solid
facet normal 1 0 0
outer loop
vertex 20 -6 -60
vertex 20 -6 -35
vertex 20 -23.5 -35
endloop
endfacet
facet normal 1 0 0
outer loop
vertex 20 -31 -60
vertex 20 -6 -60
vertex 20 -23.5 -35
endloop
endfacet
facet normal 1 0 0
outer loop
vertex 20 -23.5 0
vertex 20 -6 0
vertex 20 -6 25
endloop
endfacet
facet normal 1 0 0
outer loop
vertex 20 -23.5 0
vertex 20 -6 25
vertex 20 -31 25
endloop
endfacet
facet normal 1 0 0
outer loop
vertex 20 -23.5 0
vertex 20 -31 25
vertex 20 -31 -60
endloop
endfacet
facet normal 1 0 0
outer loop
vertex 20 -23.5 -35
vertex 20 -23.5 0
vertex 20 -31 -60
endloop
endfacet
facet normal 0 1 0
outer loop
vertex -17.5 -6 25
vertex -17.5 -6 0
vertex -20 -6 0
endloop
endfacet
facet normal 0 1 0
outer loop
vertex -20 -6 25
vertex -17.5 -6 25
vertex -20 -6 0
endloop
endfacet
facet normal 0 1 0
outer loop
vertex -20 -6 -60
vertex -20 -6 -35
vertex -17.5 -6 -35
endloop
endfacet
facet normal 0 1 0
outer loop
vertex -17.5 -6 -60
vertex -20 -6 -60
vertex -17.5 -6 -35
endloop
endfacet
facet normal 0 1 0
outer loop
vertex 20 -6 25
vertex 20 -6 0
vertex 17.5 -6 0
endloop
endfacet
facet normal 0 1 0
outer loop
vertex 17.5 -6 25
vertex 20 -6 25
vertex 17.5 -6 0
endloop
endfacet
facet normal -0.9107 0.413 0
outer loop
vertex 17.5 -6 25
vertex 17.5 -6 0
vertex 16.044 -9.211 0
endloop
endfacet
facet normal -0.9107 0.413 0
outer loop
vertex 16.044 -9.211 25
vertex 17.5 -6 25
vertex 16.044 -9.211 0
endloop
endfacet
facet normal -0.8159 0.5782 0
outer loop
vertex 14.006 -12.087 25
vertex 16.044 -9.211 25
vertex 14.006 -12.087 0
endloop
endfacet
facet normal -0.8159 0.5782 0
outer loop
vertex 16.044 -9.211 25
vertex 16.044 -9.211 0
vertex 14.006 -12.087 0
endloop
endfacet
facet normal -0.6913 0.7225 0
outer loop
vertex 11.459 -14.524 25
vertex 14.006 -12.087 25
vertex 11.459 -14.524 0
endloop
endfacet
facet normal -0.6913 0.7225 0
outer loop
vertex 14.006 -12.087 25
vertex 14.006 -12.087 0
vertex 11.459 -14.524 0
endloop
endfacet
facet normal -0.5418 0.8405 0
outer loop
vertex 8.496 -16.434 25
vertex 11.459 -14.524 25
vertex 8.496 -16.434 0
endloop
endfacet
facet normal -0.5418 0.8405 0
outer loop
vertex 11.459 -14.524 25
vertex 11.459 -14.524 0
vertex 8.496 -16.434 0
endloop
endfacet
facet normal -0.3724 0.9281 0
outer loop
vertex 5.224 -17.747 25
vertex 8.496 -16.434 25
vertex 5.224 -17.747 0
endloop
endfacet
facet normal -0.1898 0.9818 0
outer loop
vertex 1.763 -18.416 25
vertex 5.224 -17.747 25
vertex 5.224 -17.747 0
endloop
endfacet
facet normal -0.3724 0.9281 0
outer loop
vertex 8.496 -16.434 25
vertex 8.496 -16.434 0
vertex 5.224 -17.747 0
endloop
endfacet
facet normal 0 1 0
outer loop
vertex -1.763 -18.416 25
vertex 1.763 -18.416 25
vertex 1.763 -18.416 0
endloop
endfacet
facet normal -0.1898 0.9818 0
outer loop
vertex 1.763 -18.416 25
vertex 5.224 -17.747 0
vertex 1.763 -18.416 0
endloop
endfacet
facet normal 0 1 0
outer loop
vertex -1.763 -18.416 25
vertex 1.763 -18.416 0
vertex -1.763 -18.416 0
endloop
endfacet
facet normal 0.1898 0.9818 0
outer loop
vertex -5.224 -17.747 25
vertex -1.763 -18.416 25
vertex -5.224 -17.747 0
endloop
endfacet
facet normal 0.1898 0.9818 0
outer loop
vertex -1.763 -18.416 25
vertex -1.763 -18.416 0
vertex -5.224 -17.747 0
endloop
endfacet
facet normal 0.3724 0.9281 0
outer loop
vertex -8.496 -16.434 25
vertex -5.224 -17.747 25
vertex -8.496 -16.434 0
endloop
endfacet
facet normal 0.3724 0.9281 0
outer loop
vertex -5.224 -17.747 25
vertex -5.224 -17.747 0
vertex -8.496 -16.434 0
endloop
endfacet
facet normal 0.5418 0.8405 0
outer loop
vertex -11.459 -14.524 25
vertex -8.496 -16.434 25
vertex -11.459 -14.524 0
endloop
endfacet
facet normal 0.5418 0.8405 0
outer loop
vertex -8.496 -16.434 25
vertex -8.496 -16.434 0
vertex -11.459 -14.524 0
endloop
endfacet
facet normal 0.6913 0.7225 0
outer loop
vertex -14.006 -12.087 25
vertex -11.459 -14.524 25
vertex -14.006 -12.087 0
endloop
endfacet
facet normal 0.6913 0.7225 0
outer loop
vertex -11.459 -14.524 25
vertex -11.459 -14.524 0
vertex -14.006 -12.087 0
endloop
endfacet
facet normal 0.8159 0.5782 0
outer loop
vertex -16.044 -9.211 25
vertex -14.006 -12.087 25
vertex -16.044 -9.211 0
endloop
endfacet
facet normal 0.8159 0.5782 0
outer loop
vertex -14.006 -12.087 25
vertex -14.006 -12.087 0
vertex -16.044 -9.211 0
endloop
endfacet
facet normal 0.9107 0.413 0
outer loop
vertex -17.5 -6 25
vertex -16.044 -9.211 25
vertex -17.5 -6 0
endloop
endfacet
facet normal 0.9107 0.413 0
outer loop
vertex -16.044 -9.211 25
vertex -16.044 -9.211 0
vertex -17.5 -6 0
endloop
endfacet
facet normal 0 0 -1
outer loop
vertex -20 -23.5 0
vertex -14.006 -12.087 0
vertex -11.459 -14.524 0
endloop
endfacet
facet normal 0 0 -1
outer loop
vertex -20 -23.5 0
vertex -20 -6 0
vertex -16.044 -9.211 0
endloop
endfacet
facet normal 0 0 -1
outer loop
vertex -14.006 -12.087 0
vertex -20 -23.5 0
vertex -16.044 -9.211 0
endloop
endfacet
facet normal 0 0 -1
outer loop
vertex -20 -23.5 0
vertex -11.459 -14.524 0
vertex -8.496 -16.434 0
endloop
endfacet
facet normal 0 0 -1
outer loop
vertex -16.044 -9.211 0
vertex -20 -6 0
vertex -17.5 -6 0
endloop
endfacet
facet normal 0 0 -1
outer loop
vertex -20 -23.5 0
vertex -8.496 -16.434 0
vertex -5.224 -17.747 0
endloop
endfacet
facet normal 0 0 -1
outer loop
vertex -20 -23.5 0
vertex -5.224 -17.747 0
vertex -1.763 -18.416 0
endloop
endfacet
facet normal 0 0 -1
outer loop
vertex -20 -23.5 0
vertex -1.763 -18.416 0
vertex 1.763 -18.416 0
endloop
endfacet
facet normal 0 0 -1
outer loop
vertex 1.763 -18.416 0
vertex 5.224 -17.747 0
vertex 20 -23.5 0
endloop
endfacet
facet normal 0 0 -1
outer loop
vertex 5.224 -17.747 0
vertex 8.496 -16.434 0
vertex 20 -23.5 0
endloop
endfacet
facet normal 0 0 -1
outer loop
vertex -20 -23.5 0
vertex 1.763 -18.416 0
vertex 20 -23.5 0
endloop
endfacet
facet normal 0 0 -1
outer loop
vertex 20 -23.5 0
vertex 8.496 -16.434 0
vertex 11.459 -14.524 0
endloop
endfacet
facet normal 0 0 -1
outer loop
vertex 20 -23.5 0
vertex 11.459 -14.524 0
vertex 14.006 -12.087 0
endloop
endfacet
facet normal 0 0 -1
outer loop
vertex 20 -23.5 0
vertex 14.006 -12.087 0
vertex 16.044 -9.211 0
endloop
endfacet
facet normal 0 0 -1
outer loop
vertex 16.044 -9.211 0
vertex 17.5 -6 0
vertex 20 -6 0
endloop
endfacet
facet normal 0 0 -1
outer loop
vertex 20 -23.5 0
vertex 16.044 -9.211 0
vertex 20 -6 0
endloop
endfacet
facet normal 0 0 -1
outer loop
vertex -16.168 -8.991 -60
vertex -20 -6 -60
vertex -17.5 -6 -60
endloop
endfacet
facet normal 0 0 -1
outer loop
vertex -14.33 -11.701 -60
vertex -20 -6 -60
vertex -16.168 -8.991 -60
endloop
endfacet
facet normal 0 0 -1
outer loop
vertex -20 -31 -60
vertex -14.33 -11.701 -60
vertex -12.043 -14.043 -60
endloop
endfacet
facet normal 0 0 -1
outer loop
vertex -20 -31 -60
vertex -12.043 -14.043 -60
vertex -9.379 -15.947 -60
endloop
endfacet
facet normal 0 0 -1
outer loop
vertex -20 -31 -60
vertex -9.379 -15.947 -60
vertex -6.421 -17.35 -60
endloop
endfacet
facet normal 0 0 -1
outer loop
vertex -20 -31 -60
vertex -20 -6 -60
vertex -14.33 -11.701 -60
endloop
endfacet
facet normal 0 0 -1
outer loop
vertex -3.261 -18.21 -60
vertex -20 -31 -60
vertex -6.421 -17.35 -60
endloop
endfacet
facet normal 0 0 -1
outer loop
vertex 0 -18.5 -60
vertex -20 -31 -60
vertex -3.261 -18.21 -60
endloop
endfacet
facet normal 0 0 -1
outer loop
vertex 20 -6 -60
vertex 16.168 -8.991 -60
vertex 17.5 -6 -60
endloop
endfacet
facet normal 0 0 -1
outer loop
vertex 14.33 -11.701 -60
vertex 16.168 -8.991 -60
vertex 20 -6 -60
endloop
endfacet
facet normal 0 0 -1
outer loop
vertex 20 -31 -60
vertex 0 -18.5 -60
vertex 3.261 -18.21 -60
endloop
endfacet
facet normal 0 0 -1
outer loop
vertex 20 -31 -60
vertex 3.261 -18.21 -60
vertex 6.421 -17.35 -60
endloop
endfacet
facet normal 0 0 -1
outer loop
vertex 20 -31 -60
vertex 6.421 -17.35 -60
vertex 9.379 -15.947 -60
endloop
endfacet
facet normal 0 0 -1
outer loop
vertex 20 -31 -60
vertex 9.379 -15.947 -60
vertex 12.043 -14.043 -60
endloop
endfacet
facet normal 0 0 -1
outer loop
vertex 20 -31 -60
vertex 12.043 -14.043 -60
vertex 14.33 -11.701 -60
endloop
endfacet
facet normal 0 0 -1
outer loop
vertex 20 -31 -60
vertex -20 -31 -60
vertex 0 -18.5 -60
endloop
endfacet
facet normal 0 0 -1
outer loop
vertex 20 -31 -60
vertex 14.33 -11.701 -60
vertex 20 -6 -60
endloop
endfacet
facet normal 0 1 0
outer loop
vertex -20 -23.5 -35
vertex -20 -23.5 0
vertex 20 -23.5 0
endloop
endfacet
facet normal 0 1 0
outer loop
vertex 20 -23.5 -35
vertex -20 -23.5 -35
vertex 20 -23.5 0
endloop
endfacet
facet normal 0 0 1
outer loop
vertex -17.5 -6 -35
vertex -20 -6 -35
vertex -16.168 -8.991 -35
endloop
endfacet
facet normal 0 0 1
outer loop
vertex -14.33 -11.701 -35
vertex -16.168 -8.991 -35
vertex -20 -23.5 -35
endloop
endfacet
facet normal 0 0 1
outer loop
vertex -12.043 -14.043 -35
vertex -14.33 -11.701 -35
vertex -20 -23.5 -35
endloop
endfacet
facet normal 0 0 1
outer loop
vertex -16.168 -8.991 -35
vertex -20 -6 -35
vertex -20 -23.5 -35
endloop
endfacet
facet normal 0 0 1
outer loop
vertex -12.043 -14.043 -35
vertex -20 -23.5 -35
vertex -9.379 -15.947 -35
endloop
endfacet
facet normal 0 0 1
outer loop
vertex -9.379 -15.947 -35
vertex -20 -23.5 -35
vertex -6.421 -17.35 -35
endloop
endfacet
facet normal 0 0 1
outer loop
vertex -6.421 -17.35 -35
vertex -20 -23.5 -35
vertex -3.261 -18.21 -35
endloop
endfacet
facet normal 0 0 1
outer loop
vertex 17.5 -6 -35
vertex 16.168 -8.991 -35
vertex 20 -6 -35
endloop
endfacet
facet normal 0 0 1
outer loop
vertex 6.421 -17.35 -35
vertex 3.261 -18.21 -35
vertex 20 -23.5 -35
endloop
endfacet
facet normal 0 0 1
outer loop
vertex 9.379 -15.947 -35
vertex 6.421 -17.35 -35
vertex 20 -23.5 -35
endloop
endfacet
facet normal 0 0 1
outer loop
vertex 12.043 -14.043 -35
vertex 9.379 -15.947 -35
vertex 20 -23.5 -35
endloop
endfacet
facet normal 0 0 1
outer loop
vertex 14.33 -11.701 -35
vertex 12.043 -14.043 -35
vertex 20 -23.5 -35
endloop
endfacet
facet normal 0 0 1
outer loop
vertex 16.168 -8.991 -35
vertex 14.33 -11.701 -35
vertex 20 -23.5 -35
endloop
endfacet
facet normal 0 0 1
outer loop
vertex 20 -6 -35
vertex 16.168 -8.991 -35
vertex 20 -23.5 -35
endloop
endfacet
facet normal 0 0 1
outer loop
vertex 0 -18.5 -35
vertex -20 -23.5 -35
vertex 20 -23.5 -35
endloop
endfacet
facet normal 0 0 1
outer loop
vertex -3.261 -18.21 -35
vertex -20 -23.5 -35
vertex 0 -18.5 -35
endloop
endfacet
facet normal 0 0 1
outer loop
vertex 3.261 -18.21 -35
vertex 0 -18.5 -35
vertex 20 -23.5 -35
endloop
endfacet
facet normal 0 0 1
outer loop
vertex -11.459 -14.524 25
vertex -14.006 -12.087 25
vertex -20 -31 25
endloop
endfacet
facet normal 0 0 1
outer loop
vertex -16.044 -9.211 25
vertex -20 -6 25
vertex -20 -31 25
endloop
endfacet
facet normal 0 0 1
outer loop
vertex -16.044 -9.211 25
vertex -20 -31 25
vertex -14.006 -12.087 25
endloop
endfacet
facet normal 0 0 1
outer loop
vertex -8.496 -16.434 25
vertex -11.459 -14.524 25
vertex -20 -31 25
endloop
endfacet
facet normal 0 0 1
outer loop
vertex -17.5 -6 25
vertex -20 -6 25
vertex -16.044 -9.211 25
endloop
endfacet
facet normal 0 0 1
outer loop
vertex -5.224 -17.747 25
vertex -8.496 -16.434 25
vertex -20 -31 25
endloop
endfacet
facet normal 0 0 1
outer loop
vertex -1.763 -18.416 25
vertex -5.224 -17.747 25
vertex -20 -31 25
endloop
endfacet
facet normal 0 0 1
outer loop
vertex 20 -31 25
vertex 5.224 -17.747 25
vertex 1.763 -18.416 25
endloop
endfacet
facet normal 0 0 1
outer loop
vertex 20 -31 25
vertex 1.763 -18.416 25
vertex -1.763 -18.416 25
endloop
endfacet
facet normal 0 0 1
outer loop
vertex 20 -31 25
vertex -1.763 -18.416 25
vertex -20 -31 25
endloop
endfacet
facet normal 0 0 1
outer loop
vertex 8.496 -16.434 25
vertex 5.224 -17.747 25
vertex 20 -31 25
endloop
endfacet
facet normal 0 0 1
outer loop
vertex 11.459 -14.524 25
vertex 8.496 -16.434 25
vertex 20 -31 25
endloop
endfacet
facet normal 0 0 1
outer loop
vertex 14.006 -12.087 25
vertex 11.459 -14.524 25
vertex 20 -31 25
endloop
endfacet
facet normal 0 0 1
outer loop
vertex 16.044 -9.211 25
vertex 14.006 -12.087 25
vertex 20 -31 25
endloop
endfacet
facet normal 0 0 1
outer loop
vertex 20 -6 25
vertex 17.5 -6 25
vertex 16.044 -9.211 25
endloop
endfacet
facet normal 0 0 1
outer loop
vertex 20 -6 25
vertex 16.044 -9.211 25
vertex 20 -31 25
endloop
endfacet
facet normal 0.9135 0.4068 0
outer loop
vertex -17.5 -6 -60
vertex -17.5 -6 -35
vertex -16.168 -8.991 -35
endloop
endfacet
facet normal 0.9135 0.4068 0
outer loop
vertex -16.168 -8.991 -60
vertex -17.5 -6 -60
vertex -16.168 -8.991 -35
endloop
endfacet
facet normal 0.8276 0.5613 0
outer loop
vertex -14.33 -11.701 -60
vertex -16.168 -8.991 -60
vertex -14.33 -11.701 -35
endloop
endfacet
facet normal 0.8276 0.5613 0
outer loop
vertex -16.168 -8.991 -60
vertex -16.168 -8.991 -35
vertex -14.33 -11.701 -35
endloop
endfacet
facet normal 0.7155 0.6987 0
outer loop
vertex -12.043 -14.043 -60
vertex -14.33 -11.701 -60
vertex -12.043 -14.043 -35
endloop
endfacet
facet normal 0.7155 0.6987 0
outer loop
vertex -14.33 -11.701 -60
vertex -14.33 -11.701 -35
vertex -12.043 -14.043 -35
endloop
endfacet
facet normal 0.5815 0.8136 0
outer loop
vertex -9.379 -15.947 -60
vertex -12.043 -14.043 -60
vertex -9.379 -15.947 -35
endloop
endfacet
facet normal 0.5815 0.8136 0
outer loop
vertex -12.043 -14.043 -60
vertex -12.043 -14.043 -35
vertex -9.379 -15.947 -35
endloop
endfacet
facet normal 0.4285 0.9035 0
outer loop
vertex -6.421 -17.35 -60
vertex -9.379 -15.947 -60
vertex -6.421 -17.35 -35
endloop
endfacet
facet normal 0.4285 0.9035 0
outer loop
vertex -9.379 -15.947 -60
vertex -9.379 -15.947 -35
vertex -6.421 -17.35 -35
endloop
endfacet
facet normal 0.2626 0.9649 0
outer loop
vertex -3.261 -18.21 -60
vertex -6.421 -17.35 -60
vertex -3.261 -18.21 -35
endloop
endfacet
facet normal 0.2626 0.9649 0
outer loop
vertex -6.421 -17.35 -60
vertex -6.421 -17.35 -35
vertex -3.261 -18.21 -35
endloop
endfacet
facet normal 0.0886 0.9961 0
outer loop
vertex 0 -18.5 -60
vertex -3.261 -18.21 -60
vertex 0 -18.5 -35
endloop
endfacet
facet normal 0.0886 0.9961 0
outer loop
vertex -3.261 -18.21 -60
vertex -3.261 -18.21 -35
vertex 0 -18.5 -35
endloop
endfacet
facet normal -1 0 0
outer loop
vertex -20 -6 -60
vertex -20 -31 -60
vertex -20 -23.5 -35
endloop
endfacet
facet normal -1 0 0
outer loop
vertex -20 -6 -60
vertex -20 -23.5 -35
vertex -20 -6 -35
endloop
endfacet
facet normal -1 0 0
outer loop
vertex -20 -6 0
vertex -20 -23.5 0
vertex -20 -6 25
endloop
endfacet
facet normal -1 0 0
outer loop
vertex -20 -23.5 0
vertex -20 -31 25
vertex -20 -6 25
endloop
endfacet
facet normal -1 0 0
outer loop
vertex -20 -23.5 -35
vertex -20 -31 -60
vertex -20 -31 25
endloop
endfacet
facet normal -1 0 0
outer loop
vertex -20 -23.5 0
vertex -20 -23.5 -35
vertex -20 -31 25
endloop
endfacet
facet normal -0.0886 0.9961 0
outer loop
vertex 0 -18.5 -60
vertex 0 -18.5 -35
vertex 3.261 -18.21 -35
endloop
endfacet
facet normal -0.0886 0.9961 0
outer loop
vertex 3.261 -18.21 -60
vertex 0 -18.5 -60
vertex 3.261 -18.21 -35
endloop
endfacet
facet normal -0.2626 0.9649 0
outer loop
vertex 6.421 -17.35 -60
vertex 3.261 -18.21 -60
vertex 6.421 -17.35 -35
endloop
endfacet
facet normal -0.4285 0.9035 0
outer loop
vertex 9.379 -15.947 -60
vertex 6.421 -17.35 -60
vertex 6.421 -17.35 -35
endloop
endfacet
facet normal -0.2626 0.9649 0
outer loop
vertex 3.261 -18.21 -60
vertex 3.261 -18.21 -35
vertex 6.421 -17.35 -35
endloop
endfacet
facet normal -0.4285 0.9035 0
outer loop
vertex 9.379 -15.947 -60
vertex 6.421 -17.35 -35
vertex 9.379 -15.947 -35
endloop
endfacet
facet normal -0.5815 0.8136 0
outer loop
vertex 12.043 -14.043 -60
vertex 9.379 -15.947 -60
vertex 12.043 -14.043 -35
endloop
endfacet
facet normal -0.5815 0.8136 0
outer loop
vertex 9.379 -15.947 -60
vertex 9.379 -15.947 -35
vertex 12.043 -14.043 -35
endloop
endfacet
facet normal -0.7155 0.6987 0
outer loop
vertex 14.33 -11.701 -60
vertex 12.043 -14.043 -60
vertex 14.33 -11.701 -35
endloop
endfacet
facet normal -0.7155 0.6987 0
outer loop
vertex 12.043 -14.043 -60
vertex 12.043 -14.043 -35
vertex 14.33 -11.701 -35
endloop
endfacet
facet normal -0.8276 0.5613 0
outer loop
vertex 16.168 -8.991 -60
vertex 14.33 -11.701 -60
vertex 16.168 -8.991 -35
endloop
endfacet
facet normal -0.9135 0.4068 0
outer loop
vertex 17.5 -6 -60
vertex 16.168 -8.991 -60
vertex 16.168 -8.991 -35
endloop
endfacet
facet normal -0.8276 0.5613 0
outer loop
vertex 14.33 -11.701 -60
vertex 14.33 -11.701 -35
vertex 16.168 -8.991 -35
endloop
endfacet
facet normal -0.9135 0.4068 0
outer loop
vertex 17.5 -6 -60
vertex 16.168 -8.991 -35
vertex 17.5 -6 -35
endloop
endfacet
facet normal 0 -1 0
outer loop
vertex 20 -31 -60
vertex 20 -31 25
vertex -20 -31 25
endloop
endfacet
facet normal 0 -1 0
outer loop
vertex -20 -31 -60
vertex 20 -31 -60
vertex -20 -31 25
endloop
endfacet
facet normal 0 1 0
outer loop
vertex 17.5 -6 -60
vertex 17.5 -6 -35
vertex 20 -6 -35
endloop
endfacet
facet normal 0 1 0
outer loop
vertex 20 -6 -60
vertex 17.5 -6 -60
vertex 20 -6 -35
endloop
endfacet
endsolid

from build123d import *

# Parameters (mm, degrees)
F1_DEPTH = 25
F2_W     = 40
F2_H     = 12.5
F3_DEPTH = 35
F5_DEPTH = 25
F6_DEPTH = 5


with BuildPart() as f1:
    # F0 (on Top) → F1 (new body)
    with BuildSketch(Plane.XY):
        with BuildLine():
            ThreePointArc((17.5, -6), (0, -18.5), (-17.5, -6))
            Line((-17.5, -6), (-20, -6))
            Line((-20, -6), (-20, -31))
            Line((-20, -31), (20, -31))
            Line((20, -31), (20, -6))
            Line((20, -6), (17.5, -6))
        make_face()
    extrude(amount=F1_DEPTH)

    # F2 (on face) → F3 (join)
    with BuildSketch(Plane(origin=(0, 0, 0), x_dir=(1, 0, 0), z_dir=(0, 0, -1))):
        with Locations((0, 24.75)):
            Rectangle(F2_W, F2_H)
    extrude(amount=F3_DEPTH)

    # F4 (on face) → F5 (join)
    with BuildSketch(Plane(origin=(0, 0, -35), x_dir=(1, 0, 0), z_dir=(0, 0, -1))):
        with BuildLine():
            Line((-20, 6), (-17.5, 6))
            ThreePointArc((-17.5, 6), (-10.7529065838, 15.0540692173), (0, 18.5))
            Line((0, 18.5), (-20, 18.5))
            Line((-20, 18.5), (-20, 6))
        make_face()
        Polygon((-20, 18.5), (0, 18.5), (20, 18.5), (20, 31), (-20, 31), align=None)
        with BuildLine():
            ThreePointArc((0, 18.5), (10.7529065838, 15.0540692173), (17.5, 6))
            Line((17.5, 6), (20, 6))
            Line((20, 6), (20, 18.5))
            Line((20, 18.5), (0, 18.5))
        make_face()
    extrude(amount=F5_DEPTH)

    # F6 (cut): a face of the model
    f6_faces = [f1.faces().sort_by_distance(p)[0] for p in [
        (0, -18.5, -17.5),
    ]]
    extrude(f6_faces, amount=-F6_DEPTH, mode=Mode.SUBTRACT)


solid = f1.part
